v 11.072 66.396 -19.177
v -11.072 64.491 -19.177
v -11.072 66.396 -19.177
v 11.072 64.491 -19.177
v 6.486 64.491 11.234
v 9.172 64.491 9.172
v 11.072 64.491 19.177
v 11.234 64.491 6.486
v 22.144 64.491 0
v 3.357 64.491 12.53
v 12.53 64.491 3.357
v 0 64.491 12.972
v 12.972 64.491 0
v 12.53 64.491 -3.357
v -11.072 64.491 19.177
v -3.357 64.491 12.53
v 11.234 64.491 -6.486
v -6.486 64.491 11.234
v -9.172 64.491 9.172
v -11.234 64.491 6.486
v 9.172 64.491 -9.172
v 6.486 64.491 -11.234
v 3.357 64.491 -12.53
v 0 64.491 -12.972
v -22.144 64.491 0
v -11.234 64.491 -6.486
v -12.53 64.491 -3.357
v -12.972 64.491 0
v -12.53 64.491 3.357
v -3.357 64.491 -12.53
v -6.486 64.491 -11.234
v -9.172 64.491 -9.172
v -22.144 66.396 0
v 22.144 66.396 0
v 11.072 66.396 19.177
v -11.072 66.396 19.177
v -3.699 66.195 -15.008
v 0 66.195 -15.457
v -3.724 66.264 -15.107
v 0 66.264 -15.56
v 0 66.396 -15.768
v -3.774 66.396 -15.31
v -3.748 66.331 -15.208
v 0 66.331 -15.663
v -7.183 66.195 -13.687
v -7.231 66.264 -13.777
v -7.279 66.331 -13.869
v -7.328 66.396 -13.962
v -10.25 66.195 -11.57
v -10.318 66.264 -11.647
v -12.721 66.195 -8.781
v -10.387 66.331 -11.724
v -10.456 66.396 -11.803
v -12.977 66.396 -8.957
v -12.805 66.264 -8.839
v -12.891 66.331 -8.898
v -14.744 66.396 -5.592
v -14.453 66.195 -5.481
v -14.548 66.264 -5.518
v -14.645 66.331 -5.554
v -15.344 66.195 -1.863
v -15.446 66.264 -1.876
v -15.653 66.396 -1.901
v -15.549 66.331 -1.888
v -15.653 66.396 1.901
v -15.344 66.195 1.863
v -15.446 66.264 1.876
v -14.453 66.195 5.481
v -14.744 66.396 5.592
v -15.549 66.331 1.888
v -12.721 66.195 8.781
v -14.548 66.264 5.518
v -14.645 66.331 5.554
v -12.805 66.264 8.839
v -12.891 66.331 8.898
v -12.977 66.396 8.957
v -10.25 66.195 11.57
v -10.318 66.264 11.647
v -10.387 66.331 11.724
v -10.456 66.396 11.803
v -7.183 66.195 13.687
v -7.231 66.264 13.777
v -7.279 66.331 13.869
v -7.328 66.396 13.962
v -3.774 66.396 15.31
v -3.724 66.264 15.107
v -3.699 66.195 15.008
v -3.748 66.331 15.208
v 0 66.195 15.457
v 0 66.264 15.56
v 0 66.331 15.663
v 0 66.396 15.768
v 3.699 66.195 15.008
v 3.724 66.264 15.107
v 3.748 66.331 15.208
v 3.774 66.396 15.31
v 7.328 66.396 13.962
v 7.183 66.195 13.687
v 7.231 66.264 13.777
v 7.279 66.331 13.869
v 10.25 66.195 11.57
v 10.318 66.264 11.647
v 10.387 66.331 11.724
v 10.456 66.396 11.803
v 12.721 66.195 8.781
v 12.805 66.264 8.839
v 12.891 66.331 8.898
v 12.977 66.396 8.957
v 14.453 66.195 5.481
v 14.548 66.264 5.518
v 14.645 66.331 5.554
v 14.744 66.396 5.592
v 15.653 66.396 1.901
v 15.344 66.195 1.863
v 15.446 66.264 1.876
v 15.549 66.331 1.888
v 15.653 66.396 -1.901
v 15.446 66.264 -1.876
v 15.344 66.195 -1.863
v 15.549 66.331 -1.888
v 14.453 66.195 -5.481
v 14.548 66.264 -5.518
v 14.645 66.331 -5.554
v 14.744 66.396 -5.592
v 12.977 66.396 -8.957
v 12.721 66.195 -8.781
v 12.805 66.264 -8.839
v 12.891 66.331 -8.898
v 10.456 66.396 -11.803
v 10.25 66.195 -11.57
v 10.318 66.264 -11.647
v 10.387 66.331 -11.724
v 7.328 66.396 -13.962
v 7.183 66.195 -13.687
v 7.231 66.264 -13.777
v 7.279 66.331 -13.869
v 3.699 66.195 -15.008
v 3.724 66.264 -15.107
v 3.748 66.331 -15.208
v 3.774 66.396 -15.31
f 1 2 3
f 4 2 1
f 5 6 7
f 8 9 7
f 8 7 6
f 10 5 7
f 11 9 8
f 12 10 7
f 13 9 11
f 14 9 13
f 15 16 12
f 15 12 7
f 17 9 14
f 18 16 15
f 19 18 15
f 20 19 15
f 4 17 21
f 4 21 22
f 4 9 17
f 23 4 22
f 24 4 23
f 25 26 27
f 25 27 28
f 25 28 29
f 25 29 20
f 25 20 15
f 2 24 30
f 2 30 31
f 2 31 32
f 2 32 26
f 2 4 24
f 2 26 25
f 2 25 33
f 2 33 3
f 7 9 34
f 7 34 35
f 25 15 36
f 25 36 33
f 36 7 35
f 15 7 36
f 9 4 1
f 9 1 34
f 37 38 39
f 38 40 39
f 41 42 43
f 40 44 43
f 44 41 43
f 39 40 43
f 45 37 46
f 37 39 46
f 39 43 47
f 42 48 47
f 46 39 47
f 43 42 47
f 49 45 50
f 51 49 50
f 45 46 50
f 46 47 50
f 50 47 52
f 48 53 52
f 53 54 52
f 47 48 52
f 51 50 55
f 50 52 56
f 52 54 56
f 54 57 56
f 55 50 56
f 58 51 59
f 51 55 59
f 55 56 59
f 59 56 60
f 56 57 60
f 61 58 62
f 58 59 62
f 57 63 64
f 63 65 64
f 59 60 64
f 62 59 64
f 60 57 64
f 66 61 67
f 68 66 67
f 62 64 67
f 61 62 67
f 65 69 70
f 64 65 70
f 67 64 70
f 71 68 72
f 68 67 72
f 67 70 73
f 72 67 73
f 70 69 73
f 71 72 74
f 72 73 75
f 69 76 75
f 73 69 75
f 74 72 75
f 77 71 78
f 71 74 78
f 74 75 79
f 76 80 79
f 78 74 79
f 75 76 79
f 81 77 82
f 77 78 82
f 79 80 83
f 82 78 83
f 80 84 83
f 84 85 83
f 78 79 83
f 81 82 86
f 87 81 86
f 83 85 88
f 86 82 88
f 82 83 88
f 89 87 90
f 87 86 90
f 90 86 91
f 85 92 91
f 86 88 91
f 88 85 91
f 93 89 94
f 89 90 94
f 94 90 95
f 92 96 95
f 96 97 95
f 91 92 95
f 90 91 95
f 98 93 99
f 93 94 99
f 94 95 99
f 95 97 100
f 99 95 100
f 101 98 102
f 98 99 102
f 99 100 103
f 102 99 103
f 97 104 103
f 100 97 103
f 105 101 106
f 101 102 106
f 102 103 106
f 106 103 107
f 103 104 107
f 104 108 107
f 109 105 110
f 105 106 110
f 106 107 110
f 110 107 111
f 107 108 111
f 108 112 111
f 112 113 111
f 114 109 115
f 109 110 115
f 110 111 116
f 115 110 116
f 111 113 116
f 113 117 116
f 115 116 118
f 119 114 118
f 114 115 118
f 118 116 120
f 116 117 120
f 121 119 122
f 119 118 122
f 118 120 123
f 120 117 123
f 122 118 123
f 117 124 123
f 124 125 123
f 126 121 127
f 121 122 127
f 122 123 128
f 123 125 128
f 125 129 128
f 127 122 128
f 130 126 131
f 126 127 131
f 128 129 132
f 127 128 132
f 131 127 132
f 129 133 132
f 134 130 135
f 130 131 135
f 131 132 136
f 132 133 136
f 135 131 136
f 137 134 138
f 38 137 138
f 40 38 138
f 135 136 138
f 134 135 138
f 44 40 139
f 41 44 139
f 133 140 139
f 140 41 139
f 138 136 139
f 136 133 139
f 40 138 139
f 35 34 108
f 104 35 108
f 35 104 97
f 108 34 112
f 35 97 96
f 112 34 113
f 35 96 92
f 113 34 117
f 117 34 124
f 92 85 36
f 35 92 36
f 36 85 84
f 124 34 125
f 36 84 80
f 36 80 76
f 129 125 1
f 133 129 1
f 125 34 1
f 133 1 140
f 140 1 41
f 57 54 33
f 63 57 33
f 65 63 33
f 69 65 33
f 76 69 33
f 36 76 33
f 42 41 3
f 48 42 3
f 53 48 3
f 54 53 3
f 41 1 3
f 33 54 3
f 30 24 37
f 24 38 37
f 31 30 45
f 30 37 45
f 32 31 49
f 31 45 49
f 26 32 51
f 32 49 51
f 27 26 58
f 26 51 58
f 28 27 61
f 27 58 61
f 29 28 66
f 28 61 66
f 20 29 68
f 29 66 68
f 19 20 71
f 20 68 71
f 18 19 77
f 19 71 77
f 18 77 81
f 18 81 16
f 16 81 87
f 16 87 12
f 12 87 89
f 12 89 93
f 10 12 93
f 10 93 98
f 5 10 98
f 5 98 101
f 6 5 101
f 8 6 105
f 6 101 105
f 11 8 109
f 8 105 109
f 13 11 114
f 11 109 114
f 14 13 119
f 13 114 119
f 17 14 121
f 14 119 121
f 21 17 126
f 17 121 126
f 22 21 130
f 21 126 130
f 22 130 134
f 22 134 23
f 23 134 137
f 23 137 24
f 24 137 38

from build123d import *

# Parameters (mm, degrees)
EXT_HEX_DEPTH = 1.905


with BuildPart() as part:
    # Sk_hex → Ext_hex (new body)
    with BuildSketch(Plane(origin=(0, 64.4906, 0), x_dir=(1, 0, 0), z_dir=(0, 1, 0))):
        Polygon((22.143692224, 0), (11.071846112, -19.177), (-11.071846112, -19.177), (-22.143692224, 0), (-11.071846112, 19.177), (11.071846112, 19.177), align=None)
    extrude(amount=EXT_HEX_DEPTH)

    # Sk_hex_bore → Cut_hex_bore (revolve, cut)
    with BuildSketch(Plane.XY, mode=Mode.PRIVATE) as cut_hex_bore_sk:
        with BuildLine():
            Line((0, 64.008), (12.97178, 64.008))
            Line((12.97178, 64.008), (12.97178, 64.4906))
            Line((12.97178, 64.4906), (15.45717, 66.19494))
            ThreePointArc((15.45717, 66.19494), (15.611327894, 66.297467411), (15.76832, 66.3956))
            Line((15.76832, 66.3956), (15.76832, 66.802))
            Line((15.76832, 66.802), (0, 66.802))
            Line((0, 66.802), (0, 64.008))
        make_face()
    revolve(cut_hex_bore_sk.sketch.rotate(Axis((0, -25.4, 0), (0, 1, 0)), 90), axis=Axis((0, -25.4, 0), (0, 1, 0)), mode=Mode.SUBTRACT)


solid = part.part
